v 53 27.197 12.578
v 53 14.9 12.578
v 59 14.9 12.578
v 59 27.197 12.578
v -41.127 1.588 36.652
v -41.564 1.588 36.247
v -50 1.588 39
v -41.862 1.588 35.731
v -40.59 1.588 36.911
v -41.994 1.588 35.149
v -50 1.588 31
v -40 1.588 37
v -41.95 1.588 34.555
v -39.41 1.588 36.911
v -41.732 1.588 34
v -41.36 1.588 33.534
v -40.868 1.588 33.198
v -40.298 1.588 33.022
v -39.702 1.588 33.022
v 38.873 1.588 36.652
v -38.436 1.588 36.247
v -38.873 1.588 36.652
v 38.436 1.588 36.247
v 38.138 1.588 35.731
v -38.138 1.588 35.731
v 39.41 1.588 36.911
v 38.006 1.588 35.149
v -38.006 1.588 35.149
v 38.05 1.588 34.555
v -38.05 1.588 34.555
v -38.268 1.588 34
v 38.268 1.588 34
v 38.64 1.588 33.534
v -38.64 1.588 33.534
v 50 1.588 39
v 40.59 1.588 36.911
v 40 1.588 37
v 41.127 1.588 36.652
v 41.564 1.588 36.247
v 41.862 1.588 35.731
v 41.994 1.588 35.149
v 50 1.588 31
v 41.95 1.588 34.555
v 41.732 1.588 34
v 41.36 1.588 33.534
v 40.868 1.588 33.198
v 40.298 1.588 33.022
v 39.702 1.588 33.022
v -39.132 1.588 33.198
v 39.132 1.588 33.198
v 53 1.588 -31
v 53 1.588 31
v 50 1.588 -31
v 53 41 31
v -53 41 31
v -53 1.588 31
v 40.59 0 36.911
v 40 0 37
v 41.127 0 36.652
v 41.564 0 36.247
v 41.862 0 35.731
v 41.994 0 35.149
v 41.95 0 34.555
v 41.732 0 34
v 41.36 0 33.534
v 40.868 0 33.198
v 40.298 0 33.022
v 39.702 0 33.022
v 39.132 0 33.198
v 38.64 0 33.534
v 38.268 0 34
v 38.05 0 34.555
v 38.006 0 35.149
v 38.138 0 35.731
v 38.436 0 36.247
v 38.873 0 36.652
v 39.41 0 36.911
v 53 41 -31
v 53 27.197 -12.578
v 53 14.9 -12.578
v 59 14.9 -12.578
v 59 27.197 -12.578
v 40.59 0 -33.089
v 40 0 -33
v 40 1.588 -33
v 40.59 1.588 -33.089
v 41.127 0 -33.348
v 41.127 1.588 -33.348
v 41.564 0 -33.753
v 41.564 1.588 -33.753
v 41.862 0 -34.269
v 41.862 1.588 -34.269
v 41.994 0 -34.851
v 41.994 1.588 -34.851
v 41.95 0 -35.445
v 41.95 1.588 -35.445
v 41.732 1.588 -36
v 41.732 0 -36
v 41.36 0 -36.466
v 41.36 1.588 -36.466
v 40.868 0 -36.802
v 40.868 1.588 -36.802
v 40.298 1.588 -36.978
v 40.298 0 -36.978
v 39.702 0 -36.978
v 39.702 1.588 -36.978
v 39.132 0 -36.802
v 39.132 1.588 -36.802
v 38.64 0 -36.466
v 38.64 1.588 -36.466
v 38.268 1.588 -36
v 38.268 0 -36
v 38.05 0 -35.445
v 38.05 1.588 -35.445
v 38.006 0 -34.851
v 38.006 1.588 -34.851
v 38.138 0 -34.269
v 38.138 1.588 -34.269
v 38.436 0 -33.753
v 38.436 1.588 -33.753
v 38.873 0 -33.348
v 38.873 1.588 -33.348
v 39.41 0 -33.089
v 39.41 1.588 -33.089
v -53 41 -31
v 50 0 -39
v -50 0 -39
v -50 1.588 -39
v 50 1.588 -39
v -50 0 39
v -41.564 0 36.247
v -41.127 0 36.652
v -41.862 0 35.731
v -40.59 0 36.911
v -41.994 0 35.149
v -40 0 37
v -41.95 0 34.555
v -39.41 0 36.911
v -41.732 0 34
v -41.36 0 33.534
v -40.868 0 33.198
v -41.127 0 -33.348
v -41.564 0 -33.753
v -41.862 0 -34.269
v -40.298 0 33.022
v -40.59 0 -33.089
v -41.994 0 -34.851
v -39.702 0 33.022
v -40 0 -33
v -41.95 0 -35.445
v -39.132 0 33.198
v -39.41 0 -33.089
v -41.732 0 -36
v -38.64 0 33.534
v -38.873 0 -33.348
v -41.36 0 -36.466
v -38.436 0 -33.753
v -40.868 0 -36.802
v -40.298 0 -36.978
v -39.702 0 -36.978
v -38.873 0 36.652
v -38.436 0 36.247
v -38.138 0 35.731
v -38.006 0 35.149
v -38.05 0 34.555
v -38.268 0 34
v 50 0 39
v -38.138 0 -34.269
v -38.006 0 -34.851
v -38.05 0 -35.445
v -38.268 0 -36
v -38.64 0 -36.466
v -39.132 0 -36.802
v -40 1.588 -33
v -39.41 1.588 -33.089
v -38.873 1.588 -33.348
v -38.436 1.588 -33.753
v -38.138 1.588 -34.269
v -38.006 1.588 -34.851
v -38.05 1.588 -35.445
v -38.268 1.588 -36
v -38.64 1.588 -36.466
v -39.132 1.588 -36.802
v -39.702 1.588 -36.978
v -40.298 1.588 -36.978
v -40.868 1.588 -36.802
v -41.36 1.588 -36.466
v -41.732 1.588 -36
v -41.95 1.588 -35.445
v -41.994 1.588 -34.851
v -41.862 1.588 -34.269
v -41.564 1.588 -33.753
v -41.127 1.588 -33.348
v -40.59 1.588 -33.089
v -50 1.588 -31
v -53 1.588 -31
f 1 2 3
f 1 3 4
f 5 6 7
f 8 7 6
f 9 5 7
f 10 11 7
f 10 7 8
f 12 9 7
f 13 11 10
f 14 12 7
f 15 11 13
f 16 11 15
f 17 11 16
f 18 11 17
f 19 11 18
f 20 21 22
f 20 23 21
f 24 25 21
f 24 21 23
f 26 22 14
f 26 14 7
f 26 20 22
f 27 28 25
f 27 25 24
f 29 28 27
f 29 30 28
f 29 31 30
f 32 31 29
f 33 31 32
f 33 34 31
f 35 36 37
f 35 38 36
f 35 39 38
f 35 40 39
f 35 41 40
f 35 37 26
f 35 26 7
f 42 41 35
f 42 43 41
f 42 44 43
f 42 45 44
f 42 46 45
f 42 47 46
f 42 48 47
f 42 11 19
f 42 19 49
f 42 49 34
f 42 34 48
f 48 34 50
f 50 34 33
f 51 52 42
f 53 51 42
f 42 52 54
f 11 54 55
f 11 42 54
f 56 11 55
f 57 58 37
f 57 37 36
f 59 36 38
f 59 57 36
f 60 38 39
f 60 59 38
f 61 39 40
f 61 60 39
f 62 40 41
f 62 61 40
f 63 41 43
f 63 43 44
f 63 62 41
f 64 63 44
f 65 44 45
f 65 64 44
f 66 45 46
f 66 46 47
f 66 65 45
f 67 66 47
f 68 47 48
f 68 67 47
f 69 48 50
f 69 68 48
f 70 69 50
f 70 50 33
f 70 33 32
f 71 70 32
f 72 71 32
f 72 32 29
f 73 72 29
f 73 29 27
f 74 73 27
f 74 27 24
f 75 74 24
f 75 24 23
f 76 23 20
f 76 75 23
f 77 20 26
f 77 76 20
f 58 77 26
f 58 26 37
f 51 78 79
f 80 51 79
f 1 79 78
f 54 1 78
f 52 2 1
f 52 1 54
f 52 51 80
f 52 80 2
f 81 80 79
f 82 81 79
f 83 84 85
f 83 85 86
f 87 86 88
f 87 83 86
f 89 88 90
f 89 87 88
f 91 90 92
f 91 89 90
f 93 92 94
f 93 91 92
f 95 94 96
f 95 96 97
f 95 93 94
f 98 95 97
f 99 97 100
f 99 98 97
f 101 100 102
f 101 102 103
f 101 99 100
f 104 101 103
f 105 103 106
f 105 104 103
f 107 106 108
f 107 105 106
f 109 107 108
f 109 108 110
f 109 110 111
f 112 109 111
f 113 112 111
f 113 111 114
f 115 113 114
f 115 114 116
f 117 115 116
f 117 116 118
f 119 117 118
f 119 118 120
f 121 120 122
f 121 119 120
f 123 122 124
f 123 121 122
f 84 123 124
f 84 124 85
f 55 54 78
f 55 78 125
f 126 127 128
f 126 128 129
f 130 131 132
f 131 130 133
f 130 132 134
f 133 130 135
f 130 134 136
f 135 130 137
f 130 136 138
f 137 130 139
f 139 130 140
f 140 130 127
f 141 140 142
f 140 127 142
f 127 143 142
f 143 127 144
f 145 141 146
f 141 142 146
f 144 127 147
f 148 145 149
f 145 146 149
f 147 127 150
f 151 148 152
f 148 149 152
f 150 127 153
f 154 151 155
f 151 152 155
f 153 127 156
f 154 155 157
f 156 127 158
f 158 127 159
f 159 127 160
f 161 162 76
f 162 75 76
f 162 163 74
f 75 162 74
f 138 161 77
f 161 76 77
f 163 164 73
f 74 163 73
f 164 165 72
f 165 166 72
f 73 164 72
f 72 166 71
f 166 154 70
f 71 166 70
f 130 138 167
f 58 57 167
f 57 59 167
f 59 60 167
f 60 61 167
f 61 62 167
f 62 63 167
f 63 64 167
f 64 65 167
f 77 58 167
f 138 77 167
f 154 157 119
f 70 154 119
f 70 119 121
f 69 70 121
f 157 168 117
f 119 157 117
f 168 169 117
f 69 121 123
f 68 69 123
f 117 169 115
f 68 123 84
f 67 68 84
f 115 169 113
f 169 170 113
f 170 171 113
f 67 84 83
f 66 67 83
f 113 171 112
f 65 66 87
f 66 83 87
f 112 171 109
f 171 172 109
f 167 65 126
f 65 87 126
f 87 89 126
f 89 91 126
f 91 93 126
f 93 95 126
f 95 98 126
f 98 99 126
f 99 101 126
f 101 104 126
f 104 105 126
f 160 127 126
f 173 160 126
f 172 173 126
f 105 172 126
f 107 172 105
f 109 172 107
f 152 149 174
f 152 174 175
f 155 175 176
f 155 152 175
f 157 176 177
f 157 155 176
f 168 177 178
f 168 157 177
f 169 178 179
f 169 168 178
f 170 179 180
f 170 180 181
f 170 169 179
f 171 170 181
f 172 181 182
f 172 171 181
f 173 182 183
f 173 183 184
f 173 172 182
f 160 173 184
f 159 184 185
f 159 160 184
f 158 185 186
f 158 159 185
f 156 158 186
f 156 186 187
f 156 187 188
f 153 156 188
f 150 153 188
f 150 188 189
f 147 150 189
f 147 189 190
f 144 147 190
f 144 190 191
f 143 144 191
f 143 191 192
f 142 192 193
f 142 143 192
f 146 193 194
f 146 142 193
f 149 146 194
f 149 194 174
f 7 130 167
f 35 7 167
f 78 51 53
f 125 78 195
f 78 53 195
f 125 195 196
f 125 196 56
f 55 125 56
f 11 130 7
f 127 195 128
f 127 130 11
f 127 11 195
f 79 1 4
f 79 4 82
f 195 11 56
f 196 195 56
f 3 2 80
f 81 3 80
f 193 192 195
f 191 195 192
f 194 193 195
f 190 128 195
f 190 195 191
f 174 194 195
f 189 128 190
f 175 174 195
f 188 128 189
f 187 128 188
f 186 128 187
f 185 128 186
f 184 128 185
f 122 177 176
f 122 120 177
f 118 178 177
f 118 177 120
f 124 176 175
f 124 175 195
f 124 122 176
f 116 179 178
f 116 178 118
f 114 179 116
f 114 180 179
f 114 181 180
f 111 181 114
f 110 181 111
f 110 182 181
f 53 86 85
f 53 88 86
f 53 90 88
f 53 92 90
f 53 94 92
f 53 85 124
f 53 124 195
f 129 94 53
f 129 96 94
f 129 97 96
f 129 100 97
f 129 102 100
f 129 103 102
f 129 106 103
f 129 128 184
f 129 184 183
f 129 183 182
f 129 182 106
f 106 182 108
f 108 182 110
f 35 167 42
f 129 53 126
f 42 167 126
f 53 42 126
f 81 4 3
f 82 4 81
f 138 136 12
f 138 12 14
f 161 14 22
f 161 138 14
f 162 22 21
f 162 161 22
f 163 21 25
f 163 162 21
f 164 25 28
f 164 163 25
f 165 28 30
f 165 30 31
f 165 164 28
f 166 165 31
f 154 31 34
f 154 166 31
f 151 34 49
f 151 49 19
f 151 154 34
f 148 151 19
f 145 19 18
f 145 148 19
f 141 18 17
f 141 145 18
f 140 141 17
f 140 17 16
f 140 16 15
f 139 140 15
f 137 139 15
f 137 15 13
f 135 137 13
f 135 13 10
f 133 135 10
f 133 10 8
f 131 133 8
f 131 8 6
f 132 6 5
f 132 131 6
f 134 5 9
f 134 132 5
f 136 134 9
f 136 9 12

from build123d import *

# Parameters (mm, degrees)
SKETCH1_W           = 100
SKETCH1_H           = 78
SKETCH1_R           = 2
BOSS_EXTRUDE1_DEPTH = 1.5875
SKETCH2_W           = 106
SKETCH2_H           = 62
BOSS_EXTRUDE2_DEPTH = 39.4125
SKETCH3_W           = 25.156810392
SKETCH3_H           = 12.296698836
BOSS_EXTRUDE3_DEPTH = 6


with BuildPart() as part:
    # Sketch1 → Boss-Extrude1 (new body)
    with BuildSketch(Plane(origin=(0, 0, 0), x_dir=(1, 0, 0), z_dir=(0, 1, 0))):
        Rectangle(SKETCH1_W, SKETCH1_H)
        with Locations(Location((-40, 35, 0), (0, 0, 270))):
            Circle(SKETCH1_R, mode=Mode.SUBTRACT)
        with Locations(Location((40, 35, 0), (0, 0, 270))):
            Circle(SKETCH1_R, mode=Mode.SUBTRACT)
        with Locations(Location((-40, -35, 0), (0, 0, 270))):
            Circle(SKETCH1_R, mode=Mode.SUBTRACT)
        with Locations(Location((40, -35, 0), (0, 0, 270))):
            Circle(SKETCH1_R, mode=Mode.SUBTRACT)
    extrude(amount=BOSS_EXTRUDE1_DEPTH)

    # Sketch2 → Boss-Extrude2 (add)
    with BuildSketch(Plane(origin=(0, 1.5875, 0), x_dir=(-1, 0, 0), z_dir=(0, 1, 0))):
        Rectangle(SKETCH2_W, SKETCH2_H)
    extrude(amount=BOSS_EXTRUDE2_DEPTH)

    # Sketch3 → Boss-Extrude3 (add)
    with BuildSketch(Plane(origin=(53, 0, 0), x_dir=(0, 0, -1), z_dir=(1, 0, 0))):
        with Locations((0, 21.048260477)):
            Rectangle(SKETCH3_W, SKETCH3_H)
    extrude(amount=BOSS_EXTRUDE3_DEPTH)


solid = part.part
